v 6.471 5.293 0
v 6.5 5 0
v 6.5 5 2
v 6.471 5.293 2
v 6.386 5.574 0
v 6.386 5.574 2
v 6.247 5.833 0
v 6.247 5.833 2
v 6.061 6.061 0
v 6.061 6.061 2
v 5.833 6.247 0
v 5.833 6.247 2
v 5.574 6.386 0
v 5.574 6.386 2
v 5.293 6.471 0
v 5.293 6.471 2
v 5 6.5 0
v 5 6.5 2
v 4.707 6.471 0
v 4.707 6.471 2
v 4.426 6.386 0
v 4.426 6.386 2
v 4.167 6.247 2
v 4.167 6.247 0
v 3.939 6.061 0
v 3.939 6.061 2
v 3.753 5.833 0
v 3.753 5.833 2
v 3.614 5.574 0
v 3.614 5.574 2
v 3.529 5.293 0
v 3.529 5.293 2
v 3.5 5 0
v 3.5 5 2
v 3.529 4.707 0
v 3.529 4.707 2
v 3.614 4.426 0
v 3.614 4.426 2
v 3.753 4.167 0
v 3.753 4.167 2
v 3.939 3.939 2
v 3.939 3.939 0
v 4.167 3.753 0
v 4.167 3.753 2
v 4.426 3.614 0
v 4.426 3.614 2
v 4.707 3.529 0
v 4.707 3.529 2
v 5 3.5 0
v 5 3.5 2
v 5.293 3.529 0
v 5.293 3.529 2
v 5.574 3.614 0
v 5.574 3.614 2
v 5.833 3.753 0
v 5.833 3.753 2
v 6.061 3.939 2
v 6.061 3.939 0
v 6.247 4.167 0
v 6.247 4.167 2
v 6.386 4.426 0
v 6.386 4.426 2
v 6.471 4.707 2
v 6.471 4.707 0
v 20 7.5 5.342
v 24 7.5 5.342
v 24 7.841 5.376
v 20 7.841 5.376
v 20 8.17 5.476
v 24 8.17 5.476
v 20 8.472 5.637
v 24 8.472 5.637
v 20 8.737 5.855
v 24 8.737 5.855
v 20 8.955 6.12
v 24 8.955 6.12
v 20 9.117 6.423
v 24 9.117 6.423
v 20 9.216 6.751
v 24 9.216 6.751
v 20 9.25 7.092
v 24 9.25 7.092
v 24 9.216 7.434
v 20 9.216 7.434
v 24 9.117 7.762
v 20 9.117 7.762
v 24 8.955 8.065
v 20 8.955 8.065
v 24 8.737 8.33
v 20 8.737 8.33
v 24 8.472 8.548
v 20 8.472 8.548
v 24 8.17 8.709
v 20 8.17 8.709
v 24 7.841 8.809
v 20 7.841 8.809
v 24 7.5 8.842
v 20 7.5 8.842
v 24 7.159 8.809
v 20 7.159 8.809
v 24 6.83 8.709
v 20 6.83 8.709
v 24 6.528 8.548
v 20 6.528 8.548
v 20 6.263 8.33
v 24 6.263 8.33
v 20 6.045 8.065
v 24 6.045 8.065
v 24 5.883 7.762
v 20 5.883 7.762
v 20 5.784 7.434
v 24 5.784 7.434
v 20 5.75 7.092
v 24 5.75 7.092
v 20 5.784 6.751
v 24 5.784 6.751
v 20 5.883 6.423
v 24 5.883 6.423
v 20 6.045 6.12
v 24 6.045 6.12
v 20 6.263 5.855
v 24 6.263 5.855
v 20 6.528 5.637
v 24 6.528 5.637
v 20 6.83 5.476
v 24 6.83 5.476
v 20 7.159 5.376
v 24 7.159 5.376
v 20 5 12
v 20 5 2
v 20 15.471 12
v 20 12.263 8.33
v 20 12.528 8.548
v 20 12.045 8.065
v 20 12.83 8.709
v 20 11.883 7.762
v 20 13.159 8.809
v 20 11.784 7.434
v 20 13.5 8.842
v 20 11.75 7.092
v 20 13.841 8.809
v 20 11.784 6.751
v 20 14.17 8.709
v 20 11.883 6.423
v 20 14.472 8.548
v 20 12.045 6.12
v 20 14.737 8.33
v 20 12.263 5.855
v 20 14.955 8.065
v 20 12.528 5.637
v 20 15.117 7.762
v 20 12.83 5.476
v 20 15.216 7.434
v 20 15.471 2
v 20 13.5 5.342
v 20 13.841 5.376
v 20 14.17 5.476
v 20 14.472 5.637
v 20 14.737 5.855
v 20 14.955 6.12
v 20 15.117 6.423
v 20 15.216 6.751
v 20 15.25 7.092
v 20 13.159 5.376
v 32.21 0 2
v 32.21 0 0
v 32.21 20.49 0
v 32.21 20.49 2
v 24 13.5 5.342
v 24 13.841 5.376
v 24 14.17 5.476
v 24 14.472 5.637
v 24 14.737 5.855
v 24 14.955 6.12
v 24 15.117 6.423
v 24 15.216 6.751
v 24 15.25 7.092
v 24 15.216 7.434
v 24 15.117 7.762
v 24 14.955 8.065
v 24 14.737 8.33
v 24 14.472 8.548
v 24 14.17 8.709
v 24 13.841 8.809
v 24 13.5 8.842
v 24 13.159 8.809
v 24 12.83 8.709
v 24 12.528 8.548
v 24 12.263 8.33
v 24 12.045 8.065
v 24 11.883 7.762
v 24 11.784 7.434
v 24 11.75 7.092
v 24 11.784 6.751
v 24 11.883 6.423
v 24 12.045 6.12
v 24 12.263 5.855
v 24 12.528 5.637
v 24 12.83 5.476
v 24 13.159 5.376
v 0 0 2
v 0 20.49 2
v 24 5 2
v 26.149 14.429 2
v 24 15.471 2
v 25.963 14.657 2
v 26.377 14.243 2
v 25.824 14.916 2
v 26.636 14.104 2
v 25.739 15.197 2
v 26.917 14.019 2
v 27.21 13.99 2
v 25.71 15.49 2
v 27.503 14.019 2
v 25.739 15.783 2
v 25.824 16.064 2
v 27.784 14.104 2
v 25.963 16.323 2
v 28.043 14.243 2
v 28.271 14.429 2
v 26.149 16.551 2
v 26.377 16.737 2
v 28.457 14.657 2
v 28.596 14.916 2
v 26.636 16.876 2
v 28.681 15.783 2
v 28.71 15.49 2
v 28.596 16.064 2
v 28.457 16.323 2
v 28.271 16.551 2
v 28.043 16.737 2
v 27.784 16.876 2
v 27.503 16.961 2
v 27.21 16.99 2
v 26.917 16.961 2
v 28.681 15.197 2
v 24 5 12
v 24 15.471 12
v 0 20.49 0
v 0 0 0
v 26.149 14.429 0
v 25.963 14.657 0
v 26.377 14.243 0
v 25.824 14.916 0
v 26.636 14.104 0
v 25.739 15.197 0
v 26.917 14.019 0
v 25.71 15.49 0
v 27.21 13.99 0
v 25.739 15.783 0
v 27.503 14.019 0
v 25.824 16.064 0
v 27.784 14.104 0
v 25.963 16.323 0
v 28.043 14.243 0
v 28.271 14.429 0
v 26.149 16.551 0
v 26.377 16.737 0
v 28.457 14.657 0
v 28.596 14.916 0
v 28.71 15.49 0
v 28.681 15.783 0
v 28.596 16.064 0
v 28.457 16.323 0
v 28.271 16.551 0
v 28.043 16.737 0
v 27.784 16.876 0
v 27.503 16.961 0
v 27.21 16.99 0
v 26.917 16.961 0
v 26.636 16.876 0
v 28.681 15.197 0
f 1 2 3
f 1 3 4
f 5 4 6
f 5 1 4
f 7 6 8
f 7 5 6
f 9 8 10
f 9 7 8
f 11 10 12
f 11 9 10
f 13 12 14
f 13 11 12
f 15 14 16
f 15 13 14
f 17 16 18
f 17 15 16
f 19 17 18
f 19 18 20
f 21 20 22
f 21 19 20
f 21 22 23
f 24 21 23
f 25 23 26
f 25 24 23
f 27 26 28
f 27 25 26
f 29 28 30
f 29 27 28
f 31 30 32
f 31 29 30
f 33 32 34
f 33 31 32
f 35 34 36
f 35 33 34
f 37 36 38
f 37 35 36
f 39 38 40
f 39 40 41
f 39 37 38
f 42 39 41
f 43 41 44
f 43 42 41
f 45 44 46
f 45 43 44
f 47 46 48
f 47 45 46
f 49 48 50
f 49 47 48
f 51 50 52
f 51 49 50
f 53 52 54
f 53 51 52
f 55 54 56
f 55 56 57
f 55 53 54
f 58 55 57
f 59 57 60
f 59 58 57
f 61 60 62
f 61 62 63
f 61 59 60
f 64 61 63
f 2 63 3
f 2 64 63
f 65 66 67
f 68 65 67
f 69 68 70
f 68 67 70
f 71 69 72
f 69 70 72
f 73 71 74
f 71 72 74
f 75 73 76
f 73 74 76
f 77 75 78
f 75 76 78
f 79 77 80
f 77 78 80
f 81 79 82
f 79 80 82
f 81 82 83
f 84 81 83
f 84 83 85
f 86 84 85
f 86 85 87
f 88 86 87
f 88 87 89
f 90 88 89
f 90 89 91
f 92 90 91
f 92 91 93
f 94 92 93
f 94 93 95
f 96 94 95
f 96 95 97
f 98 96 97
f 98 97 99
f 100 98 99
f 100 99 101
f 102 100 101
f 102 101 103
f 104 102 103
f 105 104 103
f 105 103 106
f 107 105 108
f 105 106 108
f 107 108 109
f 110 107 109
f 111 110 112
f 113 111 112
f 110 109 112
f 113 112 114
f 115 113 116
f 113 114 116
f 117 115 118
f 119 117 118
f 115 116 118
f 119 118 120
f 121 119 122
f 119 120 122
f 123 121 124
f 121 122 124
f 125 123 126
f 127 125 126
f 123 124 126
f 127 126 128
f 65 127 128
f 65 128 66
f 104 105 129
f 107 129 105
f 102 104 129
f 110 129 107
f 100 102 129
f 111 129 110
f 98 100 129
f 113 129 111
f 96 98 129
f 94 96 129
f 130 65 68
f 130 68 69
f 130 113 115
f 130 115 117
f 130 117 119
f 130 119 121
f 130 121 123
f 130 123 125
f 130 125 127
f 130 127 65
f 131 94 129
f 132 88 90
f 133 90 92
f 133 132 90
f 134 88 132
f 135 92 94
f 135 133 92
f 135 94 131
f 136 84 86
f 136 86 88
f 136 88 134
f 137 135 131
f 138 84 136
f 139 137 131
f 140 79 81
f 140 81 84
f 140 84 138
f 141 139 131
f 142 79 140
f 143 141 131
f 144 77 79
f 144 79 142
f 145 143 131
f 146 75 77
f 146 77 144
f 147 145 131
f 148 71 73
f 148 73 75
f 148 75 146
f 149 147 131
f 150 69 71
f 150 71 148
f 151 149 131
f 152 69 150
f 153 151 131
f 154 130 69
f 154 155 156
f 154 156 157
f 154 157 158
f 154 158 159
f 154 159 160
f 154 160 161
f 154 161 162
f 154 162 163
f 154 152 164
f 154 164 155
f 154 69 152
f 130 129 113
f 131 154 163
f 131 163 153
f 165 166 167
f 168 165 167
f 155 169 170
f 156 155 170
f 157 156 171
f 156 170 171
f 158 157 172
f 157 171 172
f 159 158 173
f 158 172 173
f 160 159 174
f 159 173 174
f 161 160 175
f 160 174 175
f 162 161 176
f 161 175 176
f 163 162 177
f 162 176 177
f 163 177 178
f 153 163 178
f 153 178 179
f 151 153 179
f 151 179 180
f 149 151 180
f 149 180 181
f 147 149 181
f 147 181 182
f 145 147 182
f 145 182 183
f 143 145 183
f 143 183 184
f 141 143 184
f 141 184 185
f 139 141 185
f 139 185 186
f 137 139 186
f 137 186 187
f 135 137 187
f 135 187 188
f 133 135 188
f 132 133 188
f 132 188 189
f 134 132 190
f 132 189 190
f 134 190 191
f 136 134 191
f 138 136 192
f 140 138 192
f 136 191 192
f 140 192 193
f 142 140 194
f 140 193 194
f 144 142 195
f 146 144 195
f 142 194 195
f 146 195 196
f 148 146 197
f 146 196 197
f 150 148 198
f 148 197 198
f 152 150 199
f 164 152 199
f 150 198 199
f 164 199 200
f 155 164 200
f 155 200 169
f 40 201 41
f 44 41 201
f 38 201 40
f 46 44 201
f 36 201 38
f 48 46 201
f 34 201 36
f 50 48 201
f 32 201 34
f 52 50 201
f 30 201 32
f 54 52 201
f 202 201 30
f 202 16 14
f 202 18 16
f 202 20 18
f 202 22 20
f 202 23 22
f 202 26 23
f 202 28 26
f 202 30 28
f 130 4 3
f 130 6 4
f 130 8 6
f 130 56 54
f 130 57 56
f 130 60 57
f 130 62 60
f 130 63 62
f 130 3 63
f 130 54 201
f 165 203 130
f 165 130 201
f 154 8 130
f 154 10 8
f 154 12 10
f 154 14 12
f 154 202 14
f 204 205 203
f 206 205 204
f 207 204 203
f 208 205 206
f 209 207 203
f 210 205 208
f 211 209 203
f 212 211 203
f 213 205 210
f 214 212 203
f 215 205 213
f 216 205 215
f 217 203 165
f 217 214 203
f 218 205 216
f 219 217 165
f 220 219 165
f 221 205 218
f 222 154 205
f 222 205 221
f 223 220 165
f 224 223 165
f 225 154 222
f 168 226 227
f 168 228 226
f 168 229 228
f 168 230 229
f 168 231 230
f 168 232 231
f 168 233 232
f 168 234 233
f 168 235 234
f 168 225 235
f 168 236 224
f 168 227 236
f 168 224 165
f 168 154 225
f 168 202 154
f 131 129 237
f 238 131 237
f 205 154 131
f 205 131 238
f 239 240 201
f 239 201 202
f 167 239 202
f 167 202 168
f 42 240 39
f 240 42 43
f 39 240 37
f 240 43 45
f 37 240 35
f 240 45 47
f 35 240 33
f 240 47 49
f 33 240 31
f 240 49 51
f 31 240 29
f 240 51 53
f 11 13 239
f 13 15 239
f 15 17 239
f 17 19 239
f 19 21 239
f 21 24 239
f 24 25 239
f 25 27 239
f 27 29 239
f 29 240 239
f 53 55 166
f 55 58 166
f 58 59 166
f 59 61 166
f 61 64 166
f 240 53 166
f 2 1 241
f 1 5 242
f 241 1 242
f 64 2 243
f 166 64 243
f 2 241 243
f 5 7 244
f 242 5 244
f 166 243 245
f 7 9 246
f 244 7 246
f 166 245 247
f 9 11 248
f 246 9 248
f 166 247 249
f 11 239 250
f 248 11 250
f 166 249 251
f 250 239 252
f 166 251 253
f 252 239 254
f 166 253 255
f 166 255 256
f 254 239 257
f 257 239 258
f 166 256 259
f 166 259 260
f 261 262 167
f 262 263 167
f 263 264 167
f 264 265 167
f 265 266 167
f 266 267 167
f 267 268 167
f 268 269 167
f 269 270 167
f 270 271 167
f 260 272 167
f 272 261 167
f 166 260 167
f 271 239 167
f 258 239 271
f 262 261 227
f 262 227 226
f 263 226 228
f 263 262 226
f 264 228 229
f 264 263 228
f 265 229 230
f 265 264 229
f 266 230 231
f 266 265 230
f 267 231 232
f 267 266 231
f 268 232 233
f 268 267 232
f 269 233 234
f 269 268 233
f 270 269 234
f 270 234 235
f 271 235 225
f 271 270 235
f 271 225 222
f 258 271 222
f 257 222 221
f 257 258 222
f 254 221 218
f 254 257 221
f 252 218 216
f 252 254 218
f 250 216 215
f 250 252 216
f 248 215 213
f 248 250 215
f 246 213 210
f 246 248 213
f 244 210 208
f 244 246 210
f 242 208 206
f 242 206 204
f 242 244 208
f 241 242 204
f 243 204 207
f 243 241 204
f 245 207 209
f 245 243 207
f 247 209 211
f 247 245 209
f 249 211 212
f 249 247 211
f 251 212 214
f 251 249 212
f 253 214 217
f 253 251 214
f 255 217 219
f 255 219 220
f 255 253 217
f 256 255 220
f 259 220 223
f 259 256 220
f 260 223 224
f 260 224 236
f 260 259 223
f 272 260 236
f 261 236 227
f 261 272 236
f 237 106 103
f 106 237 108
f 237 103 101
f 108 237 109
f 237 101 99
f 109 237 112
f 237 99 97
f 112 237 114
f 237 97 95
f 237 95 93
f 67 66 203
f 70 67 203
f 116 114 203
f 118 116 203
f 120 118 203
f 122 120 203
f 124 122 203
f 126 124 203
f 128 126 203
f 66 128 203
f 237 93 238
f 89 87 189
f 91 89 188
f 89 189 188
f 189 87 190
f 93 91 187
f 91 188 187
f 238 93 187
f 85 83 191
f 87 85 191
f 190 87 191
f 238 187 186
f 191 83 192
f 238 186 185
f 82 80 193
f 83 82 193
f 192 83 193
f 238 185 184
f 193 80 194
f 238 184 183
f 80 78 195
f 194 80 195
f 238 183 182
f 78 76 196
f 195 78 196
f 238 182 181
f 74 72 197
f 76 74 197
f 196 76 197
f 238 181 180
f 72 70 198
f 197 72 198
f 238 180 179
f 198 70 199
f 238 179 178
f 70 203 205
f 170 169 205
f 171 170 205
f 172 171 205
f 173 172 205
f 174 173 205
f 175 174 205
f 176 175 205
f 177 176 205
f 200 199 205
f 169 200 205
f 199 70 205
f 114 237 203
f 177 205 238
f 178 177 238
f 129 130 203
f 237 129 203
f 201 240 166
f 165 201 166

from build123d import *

# Parameters (mm, degrees)
ESQUISSE1_W             = 32.21
ESQUISSE1_H             = 20.49
ESQUISSE1_R             = 1.5
BOSS_EXTRU_1_DEPTH      = 2
ESQUISSE2_W             = 4
ESQUISSE2_H             = 10.471151719
BOSS_EXTRU_2_DEPTH      = 10
ESQUISSE3_R             = 1.75
ENL_V_MAT_EXTRU_1_DEPTH = 10


with BuildPart() as part:
    # Esquisse1 → Boss.-Extru.1 (new body)
    with BuildSketch(Plane.XY):
        with Locations((16.105, 10.245)):
            Rectangle(ESQUISSE1_W, ESQUISSE1_H)
        with Locations((27.21, 15.49)):
            Circle(ESQUISSE1_R, mode=Mode.SUBTRACT)
        with Locations((5, 5)):
            Circle(ESQUISSE1_R, mode=Mode.SUBTRACT)
    extrude(amount=BOSS_EXTRU_1_DEPTH)

    # Esquisse2 → Boss.-Extru.2 (add)
    with BuildSketch(Plane.XY.offset(2)):
        with Locations((22, 10.23557586)):
            Rectangle(ESQUISSE2_W, ESQUISSE2_H)
    extrude(amount=BOSS_EXTRU_2_DEPTH)

    # Esquisse3 → Enlèv. mat.-Extru.1 (cut)
    with BuildSketch(Plane(origin=(24, 0, 0), x_dir=(0, 0, -1), z_dir=(1, 0, 0))):
        with Locations((-7.092486799, 13.5)):
            Circle(ESQUISSE3_R)
        with Locations((-7.092486799, 7.5)):
            Circle(ESQUISSE3_R)
    extrude(amount=-ENL_V_MAT_EXTRU_1_DEPTH, mode=Mode.SUBTRACT)


solid = part.part
